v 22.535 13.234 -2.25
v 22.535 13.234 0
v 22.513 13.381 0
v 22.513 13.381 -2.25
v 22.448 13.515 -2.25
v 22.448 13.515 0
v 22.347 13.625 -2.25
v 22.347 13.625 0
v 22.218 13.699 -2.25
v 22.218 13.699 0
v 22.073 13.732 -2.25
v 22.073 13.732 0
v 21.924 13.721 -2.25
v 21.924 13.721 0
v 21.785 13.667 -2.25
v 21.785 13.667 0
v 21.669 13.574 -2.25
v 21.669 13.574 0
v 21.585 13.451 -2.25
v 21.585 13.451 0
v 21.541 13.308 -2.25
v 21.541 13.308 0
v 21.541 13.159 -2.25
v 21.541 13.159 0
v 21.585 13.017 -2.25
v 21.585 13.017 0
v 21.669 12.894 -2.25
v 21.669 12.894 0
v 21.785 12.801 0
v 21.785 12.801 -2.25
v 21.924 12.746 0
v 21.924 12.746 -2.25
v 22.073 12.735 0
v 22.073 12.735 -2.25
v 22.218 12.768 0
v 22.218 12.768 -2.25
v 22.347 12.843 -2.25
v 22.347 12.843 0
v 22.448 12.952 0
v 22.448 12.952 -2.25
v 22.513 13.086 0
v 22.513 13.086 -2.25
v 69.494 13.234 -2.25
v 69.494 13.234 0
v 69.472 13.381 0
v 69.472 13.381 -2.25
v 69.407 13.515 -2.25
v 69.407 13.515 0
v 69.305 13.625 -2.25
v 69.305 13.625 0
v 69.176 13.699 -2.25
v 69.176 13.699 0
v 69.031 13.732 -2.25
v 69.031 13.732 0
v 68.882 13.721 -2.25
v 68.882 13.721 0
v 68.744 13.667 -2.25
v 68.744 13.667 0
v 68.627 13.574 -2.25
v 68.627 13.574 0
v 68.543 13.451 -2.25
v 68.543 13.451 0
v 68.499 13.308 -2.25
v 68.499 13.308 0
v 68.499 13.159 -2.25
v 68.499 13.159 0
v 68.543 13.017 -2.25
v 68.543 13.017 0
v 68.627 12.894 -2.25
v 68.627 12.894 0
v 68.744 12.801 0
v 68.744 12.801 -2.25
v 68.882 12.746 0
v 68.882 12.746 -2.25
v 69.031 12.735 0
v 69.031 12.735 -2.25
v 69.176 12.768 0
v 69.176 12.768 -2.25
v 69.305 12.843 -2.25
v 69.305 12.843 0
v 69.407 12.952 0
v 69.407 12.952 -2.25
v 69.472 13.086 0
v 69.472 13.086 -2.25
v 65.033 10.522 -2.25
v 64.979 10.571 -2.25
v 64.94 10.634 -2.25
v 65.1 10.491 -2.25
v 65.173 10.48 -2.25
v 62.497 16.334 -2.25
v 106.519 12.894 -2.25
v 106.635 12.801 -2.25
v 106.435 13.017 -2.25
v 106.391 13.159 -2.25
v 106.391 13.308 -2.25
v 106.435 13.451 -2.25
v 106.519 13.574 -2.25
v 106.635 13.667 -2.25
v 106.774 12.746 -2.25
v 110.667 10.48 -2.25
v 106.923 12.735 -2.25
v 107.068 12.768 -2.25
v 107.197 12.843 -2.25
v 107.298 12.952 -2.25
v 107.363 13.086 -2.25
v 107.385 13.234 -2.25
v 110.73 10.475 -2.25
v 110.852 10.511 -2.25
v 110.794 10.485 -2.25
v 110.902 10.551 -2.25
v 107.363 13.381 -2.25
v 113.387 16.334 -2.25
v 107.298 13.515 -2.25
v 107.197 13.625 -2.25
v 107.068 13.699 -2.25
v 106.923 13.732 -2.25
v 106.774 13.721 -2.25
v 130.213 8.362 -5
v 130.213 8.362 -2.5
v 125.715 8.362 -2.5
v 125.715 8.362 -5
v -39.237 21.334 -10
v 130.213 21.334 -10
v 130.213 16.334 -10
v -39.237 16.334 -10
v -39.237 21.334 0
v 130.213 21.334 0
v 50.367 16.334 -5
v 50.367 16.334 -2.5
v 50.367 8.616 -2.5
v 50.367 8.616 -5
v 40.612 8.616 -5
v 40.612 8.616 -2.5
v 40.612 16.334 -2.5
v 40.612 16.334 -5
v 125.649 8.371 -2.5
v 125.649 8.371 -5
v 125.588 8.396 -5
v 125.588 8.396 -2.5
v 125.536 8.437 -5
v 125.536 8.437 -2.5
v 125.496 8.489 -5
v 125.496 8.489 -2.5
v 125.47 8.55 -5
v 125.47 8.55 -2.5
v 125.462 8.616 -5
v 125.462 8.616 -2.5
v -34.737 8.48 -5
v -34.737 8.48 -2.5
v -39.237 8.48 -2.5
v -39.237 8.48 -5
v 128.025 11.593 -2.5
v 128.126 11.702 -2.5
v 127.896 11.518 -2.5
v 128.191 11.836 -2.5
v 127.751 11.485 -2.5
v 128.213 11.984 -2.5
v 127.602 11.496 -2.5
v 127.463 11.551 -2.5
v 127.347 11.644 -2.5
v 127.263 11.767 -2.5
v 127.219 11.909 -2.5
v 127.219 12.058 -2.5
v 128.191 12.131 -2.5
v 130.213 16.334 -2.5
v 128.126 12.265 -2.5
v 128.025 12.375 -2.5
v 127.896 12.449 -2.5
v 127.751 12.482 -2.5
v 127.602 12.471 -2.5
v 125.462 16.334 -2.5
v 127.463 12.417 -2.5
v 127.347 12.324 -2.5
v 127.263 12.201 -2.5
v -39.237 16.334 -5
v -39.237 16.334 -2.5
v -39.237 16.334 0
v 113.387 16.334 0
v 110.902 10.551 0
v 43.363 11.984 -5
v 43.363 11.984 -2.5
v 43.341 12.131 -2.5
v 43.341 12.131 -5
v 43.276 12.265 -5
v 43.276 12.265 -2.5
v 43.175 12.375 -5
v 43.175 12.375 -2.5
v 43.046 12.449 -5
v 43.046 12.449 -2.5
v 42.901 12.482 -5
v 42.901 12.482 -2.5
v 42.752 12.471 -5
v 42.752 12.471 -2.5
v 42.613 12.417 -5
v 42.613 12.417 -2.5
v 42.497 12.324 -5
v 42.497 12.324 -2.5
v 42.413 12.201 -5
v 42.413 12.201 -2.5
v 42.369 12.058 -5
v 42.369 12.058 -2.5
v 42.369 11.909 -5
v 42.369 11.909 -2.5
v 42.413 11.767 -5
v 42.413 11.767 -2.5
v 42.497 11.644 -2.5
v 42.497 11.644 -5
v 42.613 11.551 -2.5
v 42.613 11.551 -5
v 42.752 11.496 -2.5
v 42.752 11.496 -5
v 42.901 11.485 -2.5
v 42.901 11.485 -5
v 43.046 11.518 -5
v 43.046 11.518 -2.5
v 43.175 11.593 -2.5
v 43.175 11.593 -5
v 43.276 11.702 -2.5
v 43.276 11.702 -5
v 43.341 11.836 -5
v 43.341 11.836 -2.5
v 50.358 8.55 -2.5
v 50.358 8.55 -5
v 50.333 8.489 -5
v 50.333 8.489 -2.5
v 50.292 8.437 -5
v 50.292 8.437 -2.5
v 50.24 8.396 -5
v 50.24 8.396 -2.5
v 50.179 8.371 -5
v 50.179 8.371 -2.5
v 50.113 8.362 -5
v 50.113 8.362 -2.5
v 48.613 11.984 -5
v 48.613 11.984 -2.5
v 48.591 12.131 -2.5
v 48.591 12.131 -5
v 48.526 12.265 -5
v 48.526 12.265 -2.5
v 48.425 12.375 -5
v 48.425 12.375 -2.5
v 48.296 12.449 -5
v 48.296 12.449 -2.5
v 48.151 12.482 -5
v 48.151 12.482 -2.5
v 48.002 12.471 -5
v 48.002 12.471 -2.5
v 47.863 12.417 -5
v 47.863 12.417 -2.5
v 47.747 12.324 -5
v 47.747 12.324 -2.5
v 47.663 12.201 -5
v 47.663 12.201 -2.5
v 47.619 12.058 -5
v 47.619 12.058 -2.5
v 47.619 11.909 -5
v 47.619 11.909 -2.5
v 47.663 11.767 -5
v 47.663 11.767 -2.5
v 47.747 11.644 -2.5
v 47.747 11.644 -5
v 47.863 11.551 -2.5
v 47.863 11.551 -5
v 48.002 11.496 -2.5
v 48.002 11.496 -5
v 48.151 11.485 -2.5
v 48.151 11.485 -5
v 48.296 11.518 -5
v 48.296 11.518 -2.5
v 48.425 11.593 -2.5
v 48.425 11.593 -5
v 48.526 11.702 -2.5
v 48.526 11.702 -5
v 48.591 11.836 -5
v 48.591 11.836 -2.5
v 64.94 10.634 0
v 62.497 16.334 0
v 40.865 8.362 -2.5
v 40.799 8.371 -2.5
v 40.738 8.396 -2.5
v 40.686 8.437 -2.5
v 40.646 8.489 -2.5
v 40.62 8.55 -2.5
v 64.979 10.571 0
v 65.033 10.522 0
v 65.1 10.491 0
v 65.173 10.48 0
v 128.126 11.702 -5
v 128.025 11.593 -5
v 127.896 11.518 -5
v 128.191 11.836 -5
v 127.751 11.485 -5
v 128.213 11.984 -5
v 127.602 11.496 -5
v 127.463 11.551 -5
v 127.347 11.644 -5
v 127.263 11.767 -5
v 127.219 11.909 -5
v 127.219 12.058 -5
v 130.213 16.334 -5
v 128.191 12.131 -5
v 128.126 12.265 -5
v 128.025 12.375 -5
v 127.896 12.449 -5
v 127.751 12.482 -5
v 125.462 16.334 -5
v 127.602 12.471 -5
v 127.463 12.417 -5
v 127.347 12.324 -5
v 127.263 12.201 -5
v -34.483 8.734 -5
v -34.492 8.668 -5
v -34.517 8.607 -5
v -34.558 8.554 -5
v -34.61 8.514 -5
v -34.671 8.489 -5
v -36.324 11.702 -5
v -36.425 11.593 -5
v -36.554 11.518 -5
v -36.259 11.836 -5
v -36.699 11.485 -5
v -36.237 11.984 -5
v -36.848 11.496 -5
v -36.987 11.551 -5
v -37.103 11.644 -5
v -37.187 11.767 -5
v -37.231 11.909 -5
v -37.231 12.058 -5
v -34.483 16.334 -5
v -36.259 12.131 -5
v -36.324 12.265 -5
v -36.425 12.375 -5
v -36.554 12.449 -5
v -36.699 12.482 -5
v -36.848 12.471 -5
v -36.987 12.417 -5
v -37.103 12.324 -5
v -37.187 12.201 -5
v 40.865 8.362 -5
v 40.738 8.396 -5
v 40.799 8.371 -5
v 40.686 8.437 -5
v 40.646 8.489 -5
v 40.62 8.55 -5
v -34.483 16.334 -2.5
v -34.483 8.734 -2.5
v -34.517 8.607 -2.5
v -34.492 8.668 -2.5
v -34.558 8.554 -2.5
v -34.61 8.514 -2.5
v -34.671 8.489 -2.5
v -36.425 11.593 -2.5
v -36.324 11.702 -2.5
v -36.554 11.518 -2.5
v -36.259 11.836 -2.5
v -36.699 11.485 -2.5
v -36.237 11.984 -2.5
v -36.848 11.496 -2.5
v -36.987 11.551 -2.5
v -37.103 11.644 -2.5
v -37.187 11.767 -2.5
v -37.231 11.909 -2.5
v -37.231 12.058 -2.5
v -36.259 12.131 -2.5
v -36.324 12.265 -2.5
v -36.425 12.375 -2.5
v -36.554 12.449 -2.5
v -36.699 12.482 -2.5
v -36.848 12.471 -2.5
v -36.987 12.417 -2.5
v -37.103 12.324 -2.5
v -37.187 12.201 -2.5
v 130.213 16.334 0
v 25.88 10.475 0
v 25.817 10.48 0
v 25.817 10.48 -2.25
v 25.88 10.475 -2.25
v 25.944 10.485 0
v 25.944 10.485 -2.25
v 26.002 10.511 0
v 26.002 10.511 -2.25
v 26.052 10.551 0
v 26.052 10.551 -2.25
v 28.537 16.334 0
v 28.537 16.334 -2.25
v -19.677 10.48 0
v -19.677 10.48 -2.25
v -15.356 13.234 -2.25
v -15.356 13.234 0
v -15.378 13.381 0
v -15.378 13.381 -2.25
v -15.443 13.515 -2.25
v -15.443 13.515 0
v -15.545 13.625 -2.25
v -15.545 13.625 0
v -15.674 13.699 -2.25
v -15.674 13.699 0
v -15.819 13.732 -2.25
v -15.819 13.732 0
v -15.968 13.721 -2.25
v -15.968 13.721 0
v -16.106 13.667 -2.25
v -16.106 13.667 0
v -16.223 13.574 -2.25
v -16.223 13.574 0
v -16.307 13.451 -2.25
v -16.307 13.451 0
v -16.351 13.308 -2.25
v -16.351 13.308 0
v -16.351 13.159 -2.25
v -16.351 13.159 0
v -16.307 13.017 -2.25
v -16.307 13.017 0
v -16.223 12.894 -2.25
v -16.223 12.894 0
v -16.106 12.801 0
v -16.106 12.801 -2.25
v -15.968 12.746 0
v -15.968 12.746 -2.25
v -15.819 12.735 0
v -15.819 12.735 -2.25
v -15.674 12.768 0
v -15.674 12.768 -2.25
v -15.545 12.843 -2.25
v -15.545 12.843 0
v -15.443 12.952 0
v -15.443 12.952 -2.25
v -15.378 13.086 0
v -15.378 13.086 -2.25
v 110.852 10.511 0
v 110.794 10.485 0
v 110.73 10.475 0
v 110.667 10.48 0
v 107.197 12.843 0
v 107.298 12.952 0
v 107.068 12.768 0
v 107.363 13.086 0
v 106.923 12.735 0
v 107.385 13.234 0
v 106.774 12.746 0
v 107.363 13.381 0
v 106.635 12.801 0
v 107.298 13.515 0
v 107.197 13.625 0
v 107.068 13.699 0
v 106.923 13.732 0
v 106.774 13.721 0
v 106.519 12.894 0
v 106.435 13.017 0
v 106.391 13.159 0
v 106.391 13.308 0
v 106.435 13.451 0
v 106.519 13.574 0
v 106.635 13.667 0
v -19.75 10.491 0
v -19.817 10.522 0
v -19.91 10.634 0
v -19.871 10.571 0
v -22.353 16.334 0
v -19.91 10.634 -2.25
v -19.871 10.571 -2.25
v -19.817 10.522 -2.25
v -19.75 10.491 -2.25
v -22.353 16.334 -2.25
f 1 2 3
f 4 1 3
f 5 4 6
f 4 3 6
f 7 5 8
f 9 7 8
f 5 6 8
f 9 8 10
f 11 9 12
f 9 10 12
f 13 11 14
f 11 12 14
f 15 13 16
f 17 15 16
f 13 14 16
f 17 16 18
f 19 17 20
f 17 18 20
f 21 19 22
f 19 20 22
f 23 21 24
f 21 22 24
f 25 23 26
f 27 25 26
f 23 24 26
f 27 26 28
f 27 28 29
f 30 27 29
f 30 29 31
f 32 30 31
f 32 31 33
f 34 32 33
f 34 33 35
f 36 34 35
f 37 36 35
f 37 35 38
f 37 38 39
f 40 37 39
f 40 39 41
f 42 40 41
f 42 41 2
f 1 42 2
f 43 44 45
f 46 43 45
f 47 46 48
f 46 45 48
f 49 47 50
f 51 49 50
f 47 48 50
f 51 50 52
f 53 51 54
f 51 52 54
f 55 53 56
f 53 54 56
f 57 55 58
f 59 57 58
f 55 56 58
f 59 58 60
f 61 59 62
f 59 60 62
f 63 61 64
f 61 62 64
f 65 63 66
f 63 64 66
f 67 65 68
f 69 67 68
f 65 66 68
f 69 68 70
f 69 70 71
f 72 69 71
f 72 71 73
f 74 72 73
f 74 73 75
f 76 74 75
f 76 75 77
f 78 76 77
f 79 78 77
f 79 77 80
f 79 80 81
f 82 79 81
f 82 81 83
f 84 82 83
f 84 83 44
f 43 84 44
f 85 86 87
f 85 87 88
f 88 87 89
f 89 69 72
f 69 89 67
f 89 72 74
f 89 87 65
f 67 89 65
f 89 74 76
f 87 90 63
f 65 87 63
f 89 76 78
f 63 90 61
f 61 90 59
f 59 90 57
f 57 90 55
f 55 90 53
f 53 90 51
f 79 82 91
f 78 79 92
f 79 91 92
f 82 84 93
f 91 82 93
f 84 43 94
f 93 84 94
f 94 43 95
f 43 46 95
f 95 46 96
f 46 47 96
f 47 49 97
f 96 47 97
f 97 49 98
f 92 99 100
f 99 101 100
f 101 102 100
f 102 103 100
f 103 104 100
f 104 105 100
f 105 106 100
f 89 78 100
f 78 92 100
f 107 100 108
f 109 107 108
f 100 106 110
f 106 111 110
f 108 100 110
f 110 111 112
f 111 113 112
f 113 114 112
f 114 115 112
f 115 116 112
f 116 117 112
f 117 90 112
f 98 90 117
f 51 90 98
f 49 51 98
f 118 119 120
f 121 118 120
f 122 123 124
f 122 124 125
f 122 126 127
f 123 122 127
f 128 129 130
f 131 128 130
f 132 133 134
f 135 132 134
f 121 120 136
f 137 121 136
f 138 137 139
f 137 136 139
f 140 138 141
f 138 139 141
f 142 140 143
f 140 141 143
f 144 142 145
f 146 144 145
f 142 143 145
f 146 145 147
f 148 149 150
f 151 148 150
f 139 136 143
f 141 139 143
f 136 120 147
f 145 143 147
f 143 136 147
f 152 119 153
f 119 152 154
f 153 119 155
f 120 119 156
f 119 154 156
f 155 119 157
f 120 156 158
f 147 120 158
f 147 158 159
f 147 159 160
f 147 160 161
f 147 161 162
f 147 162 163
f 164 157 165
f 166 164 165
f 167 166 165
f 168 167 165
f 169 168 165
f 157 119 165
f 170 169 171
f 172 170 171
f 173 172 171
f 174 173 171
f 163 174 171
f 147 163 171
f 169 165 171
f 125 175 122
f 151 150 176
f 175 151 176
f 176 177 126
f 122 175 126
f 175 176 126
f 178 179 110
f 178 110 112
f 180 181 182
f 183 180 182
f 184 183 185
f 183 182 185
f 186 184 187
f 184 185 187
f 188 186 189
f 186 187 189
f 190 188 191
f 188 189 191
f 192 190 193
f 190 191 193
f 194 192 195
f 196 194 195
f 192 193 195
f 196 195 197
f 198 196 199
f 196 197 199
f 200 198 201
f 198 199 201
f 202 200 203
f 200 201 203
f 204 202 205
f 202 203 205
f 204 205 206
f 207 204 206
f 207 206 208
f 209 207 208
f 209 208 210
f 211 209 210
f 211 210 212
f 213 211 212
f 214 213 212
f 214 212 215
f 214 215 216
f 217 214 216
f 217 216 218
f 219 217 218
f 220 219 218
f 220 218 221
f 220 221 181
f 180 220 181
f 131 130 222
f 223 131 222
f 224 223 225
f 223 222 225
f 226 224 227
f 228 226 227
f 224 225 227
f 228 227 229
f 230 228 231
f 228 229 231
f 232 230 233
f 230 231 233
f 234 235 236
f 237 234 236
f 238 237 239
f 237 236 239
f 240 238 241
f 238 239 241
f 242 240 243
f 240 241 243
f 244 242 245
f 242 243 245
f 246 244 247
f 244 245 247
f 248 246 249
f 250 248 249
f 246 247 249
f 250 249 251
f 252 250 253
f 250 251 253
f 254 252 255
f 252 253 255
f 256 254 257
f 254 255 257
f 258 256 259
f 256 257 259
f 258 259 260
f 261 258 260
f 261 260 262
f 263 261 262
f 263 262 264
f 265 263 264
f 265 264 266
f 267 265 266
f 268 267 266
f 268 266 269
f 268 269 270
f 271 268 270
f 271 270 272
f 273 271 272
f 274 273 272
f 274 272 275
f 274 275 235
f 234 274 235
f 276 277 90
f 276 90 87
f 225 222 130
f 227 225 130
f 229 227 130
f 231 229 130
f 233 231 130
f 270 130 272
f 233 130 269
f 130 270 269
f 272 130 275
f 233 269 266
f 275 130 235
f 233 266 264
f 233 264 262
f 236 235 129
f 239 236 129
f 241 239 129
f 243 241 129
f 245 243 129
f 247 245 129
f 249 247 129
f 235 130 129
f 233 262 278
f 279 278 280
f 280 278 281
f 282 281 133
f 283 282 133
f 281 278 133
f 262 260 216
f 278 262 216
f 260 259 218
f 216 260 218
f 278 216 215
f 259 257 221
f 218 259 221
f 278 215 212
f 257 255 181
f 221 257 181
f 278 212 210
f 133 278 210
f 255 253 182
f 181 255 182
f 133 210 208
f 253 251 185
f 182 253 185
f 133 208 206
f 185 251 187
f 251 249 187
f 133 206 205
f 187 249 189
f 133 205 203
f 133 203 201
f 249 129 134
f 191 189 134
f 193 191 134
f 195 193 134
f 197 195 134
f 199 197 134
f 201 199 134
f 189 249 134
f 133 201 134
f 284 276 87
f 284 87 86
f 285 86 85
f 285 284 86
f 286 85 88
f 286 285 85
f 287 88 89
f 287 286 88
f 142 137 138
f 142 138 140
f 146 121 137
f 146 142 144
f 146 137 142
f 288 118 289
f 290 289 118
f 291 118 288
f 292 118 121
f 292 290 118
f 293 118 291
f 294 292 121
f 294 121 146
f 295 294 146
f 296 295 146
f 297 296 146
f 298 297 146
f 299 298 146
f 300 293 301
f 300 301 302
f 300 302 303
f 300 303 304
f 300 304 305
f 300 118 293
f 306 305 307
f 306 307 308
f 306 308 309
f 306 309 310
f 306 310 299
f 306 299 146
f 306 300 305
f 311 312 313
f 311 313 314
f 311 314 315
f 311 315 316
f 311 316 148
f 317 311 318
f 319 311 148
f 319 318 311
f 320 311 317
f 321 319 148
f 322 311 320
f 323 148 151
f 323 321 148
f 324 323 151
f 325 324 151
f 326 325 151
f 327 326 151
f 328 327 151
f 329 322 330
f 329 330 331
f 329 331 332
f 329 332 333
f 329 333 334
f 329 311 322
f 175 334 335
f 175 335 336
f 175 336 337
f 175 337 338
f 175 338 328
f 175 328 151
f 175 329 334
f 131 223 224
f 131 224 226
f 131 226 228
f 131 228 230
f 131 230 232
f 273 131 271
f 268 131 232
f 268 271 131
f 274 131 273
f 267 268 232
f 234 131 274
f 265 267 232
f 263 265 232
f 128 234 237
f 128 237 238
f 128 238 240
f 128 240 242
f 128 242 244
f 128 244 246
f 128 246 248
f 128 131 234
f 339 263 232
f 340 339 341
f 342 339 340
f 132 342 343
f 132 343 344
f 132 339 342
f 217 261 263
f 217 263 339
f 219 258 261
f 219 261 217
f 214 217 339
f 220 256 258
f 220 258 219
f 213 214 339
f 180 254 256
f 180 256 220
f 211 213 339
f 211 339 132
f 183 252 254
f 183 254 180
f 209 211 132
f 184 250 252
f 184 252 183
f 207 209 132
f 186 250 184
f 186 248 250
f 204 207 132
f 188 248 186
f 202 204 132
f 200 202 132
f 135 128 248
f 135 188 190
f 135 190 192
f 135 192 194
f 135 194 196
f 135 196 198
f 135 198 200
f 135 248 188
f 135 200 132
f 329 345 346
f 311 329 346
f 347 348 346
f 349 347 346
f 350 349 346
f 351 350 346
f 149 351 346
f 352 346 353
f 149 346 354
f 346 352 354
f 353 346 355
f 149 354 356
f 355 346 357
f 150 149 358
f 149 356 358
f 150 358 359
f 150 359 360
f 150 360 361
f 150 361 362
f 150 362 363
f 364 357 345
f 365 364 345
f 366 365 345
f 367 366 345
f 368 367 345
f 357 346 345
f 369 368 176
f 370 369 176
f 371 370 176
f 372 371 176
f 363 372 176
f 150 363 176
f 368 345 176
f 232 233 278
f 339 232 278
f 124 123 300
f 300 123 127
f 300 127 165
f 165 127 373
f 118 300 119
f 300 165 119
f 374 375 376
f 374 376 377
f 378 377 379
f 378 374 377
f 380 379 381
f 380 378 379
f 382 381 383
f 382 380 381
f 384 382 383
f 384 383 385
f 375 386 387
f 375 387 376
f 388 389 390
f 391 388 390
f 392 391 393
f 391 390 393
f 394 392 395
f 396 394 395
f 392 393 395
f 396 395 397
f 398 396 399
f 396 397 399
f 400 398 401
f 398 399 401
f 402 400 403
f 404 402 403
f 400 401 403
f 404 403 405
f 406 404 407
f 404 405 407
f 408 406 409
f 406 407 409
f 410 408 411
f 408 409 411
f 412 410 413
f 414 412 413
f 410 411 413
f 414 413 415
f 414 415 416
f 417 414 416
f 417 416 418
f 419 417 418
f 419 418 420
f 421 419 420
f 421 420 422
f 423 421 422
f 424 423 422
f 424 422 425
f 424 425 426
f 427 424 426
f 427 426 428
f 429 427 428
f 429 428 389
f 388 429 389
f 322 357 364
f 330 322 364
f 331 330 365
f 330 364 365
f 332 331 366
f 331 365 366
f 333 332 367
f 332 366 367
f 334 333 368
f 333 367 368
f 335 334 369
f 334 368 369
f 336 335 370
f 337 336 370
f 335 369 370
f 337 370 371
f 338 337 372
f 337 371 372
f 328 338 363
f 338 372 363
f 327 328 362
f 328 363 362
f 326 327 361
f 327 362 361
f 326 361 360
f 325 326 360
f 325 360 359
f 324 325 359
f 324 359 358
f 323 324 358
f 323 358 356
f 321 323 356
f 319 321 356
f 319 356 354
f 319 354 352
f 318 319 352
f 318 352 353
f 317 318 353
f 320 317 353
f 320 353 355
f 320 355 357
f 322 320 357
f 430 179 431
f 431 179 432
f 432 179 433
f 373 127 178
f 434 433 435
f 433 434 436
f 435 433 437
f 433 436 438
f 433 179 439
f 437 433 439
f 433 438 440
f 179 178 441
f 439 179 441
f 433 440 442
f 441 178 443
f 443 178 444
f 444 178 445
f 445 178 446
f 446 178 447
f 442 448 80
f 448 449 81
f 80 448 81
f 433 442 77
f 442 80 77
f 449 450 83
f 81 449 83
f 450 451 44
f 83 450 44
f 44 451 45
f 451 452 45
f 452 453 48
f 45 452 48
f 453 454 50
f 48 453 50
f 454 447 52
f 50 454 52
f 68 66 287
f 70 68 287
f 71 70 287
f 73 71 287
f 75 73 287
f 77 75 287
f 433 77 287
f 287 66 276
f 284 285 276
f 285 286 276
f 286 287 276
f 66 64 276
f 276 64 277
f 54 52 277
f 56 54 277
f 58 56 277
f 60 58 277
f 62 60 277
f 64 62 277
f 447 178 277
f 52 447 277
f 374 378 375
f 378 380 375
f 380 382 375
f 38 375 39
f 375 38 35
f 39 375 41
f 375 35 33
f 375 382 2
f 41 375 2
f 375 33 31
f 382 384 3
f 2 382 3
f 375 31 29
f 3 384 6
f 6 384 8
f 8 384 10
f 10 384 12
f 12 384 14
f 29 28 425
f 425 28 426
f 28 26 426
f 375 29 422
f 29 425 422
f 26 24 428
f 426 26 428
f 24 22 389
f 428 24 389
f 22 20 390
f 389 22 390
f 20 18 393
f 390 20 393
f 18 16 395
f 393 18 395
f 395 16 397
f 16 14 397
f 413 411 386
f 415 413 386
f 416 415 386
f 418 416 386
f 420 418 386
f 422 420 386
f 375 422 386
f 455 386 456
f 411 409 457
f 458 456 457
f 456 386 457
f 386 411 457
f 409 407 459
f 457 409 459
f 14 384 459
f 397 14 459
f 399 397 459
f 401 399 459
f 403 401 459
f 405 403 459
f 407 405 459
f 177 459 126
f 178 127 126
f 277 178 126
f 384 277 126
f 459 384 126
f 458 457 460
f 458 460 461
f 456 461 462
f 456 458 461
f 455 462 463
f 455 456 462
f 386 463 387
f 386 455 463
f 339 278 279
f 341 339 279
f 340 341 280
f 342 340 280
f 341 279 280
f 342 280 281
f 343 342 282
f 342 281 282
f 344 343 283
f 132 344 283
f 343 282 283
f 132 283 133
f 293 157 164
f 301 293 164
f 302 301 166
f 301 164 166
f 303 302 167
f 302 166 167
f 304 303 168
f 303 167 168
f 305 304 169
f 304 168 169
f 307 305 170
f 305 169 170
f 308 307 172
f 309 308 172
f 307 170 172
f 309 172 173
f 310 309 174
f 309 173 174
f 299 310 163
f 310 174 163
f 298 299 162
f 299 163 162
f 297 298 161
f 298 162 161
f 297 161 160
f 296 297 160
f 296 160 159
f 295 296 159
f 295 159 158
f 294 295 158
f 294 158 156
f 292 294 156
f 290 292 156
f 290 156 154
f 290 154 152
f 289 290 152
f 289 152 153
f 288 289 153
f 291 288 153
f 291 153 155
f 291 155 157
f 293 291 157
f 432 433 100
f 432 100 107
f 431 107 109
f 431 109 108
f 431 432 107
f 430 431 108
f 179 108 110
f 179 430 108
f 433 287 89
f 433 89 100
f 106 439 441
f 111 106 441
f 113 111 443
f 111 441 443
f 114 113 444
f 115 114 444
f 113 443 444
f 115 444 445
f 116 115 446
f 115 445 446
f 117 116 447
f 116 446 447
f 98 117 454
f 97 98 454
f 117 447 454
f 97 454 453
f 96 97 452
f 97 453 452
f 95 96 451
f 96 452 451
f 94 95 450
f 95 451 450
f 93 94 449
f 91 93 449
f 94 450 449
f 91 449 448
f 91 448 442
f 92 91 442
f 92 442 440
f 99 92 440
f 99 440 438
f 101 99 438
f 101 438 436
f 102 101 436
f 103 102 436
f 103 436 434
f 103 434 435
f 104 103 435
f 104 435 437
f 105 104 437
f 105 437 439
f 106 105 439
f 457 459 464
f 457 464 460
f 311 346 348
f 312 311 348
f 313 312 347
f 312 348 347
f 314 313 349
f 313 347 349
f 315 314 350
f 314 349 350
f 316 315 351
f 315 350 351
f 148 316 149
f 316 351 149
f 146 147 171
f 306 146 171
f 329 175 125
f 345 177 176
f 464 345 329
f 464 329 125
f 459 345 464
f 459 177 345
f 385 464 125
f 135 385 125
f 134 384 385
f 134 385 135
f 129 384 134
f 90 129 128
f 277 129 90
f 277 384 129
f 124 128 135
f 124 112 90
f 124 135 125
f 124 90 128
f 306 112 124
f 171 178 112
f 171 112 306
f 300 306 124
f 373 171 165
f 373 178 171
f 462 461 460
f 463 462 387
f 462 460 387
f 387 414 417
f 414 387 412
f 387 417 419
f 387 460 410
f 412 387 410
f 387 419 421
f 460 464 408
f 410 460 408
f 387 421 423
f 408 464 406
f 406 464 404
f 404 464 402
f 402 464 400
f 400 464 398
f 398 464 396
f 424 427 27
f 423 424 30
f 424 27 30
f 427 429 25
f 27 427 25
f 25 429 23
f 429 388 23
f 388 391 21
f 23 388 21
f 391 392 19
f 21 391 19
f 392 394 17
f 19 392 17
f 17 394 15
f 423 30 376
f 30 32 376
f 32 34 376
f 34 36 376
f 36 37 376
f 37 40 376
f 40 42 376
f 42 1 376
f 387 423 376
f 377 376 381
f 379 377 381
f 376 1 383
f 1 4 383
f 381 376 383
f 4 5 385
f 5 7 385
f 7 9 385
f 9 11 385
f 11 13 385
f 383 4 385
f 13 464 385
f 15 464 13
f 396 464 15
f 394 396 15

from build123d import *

# Parameters (mm, degrees)
BOSS_EXTRUDE6_DEPTH     = 2.25
BOSS_EXTRUDE6_2_DEPTH   = 2.25
BOSS_EXTRUDE7_DEPTH     = 10
BOSS_EXTRUDE8_START     = -2.5
BOSS_EXTRUDE8_DEPTH     = 2.5
SKETCH8_R               = 0.5
CUT_EXTRUDE1_DEPTH      = 1
CUT_EXTRUDE1_DEPTH_BACK = 11


with BuildPart() as part:
    # Sketch7 → Boss-Extrude6 (new body)
    with BuildSketch(Plane.XY):
        with BuildLine():
            Line((28.537398615, 16.333832112), (-22.352574149, 16.333832112))
            Line((-22.352574149, 16.333832112), (-19.910011337, 10.634068342))
            ThreePointArc((-19.910011337, 10.634068342), (-19.816511792, 10.522258081), (-19.67689491, 10.480415214))
            Line((-19.67689491, 10.480415214), (25.816632323, 10.480415214))
            ThreePointArc((25.816632323, 10.480415214), (25.943590008, 10.484966358), (26.052322057, 10.550664975))
            Line((26.052322057, 10.550664975), (28.537398615, 16.333832112))
        make_face()
    extrude(amount=-BOSS_EXTRUDE6_DEPTH)



with BuildPart() as body_2:
    # Sketch7 → Boss-Extrude6 2 (new body)
    with BuildSketch(Plane.XY):
        with BuildLine():
            Line((113.387398615, 16.333832112), (62.497425851, 16.333832112))
            Line((62.497425851, 16.333832112), (64.939988663, 10.634068342))
            ThreePointArc((64.939988663, 10.634068342), (65.033488208, 10.522258081), (65.17310509, 10.480415214))
            Line((65.17310509, 10.480415214), (110.666632323, 10.480415214))
            ThreePointArc((110.666632323, 10.480415214), (110.793590008, 10.484966358), (110.902322057, 10.550664975))
            Line((110.902322057, 10.550664975), (113.387398615, 16.333832112))
        make_face()
    extrude(amount=-BOSS_EXTRUDE6_2_DEPTH)


with BuildPart() as part_1:
    add(part.part)

    add(body_2.part)  # Boss-Extrude7 merges body 2
    # Sketch7<12> → Boss-Extrude7 (add)
    with BuildSketch(Plane.XY):
        Polygon((130.21331835, 21.333832112), (130.21331835, 16.333832112), (125.46156201, 16.333832112), (113.387398615, 16.333832112), (62.497425851, 16.333832112), (50.366516028, 16.333832112), (40.61156201, 16.333832112), (28.537398615, 16.333832112), (-22.352574149, 16.333832112), (-34.483483972, 16.333832112), (-39.23668165, 16.333832112), (-39.23668165, 21.333832112), align=None)
    extrude(amount=-BOSS_EXTRUDE7_DEPTH)

    # Sketch7<13> → Boss-Extrude8 (add)
    with BuildSketch(Plane.XY.offset(BOSS_EXTRUDE8_START)):
        with BuildLine():
            Line((-34.736999841, 8.480030179), (-39.23668165, 8.480030179))
            Line((-39.23668165, 8.480030179), (-39.23668165, 16.333832112))
            Line((-39.23668165, 16.333832112), (-34.483483972, 16.333832112))
            Line((-34.483483972, 16.333832112), (-34.483483972, 8.733645436))
            ThreePointArc((-34.483483972, 8.733645436), (-34.557731024, 8.554347504), (-34.736999841, 8.480030179))
        make_face()
        with BuildLine():
            Line((40.61156201, 8.615866414), (40.61156201, 16.333832112))
            Line((40.61156201, 16.333832112), (50.366516028, 16.333832112))
            Line((50.366516028, 16.333832112), (50.366516028, 8.61586641))
            ThreePointArc((50.366516028, 8.61586641), (50.292268976, 8.436568478), (50.113000159, 8.362251153))
            Line((50.113000159, 8.362251153), (40.86508696, 8.362251153))
            ThreePointArc((40.86508696, 8.362251153), (40.685812272, 8.43656527), (40.61156201, 8.615866414))
        make_face()
        with BuildLine():
            Line((125.46156201, 8.615866414), (125.46156201, 16.333832112))
            Line((125.46156201, 16.333832112), (130.21331835, 16.333832112))
            Line((130.21331835, 16.333832112), (130.21331835, 8.362251153))
            Line((130.21331835, 8.362251153), (125.71508696, 8.362251153))
            ThreePointArc((125.71508696, 8.362251153), (125.535812272, 8.43656527), (125.46156201, 8.615866414))
        make_face()
    extrude(amount=-BOSS_EXTRUDE8_DEPTH)

    # Sketch8 → Cut-Extrude1 (cut, two sides)
    with BuildSketch(Plane.XY) as cut_extrude1_sk:
        with Locations((-36.73668165, 11.983669629)):
            Circle(SKETCH8_R)
        with Locations((-15.856255457, 13.233669629)):
            Circle(SKETCH8_R)
        with Locations((22.035256017, 13.233669629)):
            Circle(SKETCH8_R)
        with Locations((42.86331835, 11.983669629)):
            Circle(SKETCH8_R)
        with Locations((48.11331835, 11.983669629)):
            Circle(SKETCH8_R)
        with Locations((68.993744543, 13.233669629)):
            Circle(SKETCH8_R)
        with Locations((106.885256017, 13.233669629)):
            Circle(SKETCH8_R)
        with Locations((127.71331835, 11.983669629)):
            Circle(SKETCH8_R)
    extrude(amount=CUT_EXTRUDE1_DEPTH, mode=Mode.SUBTRACT)
    extrude(cut_extrude1_sk.sketch, amount=-CUT_EXTRUDE1_DEPTH_BACK, mode=Mode.SUBTRACT)


solid = part_1.part
